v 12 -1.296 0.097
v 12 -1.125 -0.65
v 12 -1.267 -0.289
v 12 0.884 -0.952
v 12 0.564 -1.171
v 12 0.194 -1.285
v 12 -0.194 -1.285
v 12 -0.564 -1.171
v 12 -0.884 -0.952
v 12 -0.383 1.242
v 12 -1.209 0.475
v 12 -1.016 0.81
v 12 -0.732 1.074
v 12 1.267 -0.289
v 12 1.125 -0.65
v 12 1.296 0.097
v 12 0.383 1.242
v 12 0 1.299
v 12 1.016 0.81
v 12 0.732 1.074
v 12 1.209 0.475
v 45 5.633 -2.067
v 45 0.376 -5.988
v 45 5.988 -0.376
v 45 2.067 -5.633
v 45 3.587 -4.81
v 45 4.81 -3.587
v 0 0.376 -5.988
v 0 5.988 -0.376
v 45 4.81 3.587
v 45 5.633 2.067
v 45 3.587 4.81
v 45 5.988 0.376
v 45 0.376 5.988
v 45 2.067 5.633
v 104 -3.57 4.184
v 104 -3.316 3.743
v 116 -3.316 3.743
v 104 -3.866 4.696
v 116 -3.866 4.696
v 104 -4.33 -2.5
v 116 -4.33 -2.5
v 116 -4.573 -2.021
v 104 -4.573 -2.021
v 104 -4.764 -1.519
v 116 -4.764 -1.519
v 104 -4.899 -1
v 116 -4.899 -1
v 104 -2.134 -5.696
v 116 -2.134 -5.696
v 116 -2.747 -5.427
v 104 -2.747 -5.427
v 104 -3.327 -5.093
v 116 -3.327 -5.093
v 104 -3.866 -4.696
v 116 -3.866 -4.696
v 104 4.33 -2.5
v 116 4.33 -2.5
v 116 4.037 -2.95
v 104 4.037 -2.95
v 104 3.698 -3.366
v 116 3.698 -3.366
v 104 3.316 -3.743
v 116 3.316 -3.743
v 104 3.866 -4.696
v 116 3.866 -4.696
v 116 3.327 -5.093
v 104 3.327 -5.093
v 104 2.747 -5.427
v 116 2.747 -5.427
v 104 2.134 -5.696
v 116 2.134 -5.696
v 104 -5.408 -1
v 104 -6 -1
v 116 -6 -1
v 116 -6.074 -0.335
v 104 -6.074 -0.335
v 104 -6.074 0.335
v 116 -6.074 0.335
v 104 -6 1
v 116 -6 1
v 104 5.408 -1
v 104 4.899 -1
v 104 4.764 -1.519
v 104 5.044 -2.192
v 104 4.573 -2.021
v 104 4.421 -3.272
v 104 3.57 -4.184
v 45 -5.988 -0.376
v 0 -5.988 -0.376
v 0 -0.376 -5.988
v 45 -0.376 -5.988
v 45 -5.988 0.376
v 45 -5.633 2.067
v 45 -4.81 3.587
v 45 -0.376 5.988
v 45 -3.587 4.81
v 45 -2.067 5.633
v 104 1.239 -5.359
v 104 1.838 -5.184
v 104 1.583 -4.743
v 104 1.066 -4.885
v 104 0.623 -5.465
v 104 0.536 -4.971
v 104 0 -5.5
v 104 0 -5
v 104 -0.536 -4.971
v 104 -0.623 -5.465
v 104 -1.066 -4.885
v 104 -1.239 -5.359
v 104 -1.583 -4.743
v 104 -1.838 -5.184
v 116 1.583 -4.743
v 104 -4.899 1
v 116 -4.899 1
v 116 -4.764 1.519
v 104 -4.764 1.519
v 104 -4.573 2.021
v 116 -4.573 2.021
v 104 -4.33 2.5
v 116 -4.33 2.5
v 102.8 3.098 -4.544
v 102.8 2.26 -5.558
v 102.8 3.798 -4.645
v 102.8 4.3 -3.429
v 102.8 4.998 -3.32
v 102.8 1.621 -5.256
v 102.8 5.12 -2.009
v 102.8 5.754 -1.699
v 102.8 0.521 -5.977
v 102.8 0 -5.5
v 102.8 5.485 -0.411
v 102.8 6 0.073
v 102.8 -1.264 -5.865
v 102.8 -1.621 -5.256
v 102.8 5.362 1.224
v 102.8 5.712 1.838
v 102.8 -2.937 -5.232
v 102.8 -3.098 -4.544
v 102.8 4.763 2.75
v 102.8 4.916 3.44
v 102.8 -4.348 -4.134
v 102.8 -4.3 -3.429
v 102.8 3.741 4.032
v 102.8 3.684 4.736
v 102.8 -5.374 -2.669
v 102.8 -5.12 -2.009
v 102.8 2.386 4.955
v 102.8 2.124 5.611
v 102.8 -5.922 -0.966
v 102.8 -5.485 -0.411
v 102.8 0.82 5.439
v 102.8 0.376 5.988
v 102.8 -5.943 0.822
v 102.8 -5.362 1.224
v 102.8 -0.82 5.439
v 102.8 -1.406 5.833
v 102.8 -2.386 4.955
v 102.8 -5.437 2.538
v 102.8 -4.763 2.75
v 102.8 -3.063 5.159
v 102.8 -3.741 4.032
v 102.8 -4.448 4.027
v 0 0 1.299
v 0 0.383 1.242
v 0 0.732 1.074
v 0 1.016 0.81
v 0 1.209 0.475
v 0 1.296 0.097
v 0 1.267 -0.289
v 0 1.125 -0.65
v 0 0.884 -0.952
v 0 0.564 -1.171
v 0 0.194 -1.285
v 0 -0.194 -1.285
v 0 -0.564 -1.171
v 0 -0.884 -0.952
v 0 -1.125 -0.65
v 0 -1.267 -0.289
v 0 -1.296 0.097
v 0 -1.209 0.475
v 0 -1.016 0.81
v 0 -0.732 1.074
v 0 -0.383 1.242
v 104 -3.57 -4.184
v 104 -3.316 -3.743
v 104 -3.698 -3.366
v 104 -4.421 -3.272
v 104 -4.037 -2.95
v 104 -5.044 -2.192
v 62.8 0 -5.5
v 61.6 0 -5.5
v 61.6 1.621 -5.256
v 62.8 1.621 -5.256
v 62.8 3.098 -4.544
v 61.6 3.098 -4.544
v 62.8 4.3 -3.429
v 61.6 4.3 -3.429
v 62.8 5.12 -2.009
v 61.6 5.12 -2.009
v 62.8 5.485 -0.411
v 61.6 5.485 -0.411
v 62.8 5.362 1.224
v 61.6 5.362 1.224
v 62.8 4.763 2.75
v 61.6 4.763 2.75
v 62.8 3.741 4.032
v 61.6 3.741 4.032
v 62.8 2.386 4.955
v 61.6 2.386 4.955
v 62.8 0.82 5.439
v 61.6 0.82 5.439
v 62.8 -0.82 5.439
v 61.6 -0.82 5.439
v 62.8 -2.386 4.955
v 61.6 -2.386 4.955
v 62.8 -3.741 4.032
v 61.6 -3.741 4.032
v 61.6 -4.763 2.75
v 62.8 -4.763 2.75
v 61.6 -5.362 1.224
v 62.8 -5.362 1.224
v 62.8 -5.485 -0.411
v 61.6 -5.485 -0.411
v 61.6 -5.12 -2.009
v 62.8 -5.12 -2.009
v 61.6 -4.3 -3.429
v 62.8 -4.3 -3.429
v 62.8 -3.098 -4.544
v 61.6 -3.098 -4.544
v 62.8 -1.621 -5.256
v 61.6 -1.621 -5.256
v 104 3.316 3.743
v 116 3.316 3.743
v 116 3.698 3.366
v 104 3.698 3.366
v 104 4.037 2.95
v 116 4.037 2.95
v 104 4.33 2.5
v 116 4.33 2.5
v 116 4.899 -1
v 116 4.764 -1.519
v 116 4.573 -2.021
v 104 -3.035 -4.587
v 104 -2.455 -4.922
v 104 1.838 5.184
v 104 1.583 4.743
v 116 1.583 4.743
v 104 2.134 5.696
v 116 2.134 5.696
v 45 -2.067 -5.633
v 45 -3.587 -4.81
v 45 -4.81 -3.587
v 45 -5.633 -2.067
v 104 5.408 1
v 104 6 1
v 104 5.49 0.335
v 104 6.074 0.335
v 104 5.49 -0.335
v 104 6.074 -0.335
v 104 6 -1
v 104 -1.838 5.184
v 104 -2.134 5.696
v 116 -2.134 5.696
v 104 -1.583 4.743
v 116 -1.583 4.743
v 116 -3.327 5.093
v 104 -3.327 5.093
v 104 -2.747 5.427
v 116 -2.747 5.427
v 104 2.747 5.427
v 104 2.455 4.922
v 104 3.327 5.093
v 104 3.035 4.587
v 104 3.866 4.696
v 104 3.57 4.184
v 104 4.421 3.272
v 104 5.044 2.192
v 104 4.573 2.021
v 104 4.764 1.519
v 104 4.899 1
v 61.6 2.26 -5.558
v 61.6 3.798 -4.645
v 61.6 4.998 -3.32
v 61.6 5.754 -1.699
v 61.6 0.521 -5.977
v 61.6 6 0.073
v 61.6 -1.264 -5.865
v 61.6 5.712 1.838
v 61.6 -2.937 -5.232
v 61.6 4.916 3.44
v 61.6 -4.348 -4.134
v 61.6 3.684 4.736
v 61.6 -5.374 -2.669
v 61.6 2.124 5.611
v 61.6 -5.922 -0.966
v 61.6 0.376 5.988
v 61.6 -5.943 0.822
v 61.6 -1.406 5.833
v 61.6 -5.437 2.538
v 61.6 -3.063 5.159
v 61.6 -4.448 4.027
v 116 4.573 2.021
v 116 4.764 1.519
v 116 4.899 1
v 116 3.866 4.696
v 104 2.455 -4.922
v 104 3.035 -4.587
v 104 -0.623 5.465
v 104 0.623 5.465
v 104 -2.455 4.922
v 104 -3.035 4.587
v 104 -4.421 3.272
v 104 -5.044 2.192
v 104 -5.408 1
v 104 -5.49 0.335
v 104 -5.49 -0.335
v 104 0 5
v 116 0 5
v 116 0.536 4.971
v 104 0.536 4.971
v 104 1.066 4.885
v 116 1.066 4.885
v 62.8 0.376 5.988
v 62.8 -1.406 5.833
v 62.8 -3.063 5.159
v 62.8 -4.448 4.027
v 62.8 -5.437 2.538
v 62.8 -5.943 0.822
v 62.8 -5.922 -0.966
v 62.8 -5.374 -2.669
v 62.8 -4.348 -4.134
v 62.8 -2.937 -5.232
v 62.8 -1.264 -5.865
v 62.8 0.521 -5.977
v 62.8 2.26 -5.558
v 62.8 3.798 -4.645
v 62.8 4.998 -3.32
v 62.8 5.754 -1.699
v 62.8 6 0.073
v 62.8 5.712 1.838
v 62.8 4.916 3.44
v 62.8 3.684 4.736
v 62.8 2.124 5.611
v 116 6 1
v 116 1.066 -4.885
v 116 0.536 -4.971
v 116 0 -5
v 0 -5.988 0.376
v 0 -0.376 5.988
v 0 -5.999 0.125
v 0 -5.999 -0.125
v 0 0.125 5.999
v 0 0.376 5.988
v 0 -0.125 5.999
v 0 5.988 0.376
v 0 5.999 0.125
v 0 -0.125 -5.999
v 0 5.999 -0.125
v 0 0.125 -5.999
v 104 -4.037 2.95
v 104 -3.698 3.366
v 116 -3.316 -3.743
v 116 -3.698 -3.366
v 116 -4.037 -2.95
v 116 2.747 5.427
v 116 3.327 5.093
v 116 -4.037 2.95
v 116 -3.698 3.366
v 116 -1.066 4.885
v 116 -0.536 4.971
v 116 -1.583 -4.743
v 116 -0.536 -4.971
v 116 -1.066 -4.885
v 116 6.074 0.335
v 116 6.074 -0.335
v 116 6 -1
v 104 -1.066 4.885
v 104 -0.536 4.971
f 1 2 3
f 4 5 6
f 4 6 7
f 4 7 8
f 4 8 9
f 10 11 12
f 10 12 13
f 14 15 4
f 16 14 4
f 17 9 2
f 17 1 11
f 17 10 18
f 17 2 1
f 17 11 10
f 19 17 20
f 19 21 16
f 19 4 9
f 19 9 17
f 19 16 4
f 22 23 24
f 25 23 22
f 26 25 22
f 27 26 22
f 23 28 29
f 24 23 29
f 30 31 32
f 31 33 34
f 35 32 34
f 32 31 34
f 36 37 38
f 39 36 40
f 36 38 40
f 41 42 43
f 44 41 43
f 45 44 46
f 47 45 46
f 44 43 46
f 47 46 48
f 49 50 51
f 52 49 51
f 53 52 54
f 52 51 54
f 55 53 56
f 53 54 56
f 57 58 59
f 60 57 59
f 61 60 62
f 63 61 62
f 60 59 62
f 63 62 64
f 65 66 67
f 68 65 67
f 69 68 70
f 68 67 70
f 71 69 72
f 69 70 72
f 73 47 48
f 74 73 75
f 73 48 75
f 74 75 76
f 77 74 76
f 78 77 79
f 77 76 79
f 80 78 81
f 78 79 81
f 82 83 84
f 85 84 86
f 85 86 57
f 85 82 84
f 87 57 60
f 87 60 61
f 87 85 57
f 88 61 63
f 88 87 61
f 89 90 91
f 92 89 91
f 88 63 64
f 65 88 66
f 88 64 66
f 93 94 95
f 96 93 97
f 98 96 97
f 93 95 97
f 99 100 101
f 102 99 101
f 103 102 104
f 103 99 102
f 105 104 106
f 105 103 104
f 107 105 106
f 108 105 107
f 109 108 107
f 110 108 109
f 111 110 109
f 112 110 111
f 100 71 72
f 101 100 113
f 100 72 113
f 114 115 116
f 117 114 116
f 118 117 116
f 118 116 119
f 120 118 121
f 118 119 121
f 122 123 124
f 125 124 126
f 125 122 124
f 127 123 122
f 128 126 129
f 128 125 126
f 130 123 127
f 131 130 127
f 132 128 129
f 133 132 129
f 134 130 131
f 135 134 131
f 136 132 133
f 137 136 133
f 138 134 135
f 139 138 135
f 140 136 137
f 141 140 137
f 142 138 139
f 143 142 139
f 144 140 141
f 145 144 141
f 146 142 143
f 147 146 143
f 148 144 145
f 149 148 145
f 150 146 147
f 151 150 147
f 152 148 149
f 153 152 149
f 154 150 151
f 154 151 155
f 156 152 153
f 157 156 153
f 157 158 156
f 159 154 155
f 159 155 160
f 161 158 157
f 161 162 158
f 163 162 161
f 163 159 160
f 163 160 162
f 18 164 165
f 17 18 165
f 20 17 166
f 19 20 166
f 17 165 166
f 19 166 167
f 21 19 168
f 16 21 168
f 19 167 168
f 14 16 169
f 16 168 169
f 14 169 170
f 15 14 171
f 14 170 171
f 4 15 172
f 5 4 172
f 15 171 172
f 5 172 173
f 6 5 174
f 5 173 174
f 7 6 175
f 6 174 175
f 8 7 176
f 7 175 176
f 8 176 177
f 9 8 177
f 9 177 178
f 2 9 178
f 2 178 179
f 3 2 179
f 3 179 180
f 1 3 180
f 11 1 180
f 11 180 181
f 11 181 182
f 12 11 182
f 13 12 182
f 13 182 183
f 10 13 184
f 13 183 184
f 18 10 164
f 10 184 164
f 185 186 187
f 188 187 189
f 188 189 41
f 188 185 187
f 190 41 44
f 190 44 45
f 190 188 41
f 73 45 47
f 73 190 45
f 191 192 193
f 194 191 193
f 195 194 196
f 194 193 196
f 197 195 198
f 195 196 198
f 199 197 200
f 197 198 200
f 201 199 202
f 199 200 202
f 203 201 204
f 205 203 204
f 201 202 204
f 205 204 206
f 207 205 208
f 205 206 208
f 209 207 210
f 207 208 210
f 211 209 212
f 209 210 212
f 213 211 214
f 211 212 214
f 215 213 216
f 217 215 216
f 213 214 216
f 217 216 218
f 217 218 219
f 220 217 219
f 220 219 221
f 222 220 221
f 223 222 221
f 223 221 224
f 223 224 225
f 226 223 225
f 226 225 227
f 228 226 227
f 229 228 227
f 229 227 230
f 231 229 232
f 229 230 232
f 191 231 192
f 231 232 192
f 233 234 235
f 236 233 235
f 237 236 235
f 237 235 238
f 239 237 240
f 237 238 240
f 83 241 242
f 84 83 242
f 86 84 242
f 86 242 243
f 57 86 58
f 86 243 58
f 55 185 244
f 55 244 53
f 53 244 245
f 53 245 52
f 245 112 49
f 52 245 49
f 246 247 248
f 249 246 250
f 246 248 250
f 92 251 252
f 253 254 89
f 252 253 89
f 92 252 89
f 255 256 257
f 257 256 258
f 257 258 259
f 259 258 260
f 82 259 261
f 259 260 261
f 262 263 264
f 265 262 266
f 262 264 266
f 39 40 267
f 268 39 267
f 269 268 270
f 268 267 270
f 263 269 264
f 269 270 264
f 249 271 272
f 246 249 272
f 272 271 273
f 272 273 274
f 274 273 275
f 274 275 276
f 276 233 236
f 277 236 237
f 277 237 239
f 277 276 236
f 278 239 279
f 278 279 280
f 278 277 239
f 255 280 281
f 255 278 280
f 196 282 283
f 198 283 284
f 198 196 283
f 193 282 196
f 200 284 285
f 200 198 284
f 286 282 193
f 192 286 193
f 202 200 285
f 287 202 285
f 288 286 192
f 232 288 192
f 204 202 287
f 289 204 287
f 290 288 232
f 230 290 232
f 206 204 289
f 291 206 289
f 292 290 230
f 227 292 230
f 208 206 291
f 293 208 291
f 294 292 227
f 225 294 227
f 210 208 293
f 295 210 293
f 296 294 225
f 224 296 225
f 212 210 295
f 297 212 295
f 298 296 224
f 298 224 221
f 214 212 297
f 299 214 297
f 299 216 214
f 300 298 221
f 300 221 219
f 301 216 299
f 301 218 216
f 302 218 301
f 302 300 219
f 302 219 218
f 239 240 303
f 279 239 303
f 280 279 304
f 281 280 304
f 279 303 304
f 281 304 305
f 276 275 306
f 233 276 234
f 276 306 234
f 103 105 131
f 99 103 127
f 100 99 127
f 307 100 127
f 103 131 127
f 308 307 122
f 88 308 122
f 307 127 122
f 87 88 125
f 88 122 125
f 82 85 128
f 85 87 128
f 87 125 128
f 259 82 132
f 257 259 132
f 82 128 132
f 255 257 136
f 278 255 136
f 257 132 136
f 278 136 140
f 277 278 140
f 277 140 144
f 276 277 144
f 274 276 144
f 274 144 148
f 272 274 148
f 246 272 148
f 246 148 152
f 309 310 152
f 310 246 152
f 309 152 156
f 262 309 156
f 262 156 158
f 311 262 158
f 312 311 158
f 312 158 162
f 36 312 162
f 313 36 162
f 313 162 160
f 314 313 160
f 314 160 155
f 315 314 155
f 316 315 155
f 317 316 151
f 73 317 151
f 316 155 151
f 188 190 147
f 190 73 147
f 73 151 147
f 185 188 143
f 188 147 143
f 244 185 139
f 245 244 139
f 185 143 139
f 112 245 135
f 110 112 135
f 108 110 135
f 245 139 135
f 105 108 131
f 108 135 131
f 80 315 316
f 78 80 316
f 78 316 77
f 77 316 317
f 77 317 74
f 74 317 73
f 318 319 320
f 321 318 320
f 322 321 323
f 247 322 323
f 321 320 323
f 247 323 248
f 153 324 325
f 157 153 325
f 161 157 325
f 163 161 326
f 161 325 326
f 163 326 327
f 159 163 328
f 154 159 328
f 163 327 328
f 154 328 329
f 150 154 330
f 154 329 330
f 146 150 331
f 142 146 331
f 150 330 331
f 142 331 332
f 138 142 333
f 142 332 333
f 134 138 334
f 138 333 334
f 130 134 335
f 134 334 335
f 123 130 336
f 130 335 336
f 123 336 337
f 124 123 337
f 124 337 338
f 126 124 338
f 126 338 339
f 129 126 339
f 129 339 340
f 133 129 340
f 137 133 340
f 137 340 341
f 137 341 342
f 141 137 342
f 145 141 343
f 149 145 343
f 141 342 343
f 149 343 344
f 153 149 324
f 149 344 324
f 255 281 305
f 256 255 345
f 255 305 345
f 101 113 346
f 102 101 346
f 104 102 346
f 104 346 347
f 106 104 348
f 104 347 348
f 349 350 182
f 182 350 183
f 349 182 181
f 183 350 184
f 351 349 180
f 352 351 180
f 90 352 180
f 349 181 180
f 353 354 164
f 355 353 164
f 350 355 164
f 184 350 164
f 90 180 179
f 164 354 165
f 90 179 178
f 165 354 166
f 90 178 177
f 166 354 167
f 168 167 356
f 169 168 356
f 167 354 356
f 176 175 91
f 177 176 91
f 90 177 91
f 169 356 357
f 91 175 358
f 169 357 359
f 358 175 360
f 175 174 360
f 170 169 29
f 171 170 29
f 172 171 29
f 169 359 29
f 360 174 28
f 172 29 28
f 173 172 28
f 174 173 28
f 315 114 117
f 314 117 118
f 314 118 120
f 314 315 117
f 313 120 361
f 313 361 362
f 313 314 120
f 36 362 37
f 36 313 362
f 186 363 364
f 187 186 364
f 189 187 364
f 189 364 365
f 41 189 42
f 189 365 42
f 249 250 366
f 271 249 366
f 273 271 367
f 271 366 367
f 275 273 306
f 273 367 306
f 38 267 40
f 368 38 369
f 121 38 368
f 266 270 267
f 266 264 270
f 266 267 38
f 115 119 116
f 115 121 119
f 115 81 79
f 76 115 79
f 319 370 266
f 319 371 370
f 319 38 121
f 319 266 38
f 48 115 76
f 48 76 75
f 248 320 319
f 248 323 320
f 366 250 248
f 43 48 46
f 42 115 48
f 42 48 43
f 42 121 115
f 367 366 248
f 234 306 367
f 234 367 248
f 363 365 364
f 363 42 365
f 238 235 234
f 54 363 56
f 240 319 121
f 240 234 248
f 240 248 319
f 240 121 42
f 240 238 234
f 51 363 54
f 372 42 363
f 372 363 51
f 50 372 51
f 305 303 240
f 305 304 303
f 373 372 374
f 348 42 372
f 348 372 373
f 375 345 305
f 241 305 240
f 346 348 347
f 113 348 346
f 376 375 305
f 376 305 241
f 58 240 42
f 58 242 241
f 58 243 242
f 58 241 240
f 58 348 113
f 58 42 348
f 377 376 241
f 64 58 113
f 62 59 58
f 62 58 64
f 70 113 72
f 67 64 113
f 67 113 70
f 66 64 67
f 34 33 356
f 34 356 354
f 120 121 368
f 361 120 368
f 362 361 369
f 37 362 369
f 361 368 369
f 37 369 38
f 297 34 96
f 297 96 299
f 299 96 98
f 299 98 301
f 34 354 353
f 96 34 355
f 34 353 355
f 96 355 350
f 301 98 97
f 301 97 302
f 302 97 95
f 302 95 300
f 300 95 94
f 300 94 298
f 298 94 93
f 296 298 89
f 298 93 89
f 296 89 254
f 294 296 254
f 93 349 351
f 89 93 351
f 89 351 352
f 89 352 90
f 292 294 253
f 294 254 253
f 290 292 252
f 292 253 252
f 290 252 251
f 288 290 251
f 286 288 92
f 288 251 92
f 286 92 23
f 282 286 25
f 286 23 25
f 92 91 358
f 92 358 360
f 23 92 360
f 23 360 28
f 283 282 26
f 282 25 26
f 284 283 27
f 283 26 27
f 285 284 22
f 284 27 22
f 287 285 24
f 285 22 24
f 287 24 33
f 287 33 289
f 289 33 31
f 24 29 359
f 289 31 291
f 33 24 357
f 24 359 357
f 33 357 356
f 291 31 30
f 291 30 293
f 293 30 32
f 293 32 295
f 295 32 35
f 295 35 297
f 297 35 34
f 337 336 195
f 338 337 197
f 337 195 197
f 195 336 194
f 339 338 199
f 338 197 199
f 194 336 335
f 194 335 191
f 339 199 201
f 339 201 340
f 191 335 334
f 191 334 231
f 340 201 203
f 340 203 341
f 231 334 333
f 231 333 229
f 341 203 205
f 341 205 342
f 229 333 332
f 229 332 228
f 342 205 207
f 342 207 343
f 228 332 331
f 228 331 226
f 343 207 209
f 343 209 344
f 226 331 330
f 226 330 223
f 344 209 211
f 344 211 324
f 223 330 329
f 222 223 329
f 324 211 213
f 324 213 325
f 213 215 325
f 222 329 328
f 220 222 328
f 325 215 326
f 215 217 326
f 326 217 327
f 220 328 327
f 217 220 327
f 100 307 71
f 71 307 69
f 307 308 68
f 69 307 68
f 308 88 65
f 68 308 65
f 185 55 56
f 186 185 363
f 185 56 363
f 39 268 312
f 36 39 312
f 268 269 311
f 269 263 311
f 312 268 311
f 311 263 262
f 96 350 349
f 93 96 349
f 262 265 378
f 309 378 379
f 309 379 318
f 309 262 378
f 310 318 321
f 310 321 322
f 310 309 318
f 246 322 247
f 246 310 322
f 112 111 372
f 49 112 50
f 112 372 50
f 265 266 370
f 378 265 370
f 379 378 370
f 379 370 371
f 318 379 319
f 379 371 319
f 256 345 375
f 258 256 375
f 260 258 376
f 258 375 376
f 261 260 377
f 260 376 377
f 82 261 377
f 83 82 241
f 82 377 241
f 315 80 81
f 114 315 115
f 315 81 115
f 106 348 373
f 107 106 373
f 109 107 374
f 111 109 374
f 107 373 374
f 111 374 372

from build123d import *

# Parameters (mm, degrees)
EXTRUDE_1_DEPTH          = 45
SKETCH_2_R               = 6
EXTRUDE_2_DEPTH          = 16.6
SKETCH_3_R               = 5.5
EXTRUDE_3_DEPTH          = 1.2
SKETCH_4_R               = 6
EXTRUDE_4_DEPTH          = 40
SKETCH_5_R               = 5.5
EXTRUDE_5_DEPTH          = 1.2
SKETCH_6_R               = 7
EXTRUDE_6_DEPTH          = 12
CUT_EXTRUDE_1_DEPTH      = 12
PATTERN_CIRCULAR_1_COUNT = 6
SKETCH_9_OUTSIDE_W       = 38.206
SKETCH_9_OUTSIDE_H       = 38.206
SKETCH_9_OUTSIDE_R       = 6
CUT_EXTRUDE_2_DEPTH      = 72.56814934
SKETCH_13_R              = 1.29930571
CUT_EXTRUDE_3_DEPTH      = 12


with BuildPart() as part:
    # 草图1 → 凸台-拉伸1 (new body)
    with BuildSketch(Plane(origin=(0, 0, 0), x_dir=(0, 0, -1), z_dir=(1, 0, 0))):
        Polygon((6.363961031, 0), (0, 6.363961031), (-6.363961031, 0), (0, -6.363961031), align=None)
    extrude(amount=EXTRUDE_1_DEPTH)

    # 草图2 → 凸台-拉伸2 (add)
    with BuildSketch(Plane(origin=(45, 0, 0), x_dir=(0, 0, -1), z_dir=(1, 0, 0))):
        Circle(SKETCH_2_R)
    extrude(amount=EXTRUDE_2_DEPTH)

    # 草图3 → 凸台-拉伸3 (add)
    with BuildSketch(Plane(origin=(61.6, 0, 0), x_dir=(0, 0, -1), z_dir=(1, 0, 0))):
        Circle(SKETCH_3_R)
    extrude(amount=EXTRUDE_3_DEPTH)

    # 草图4 → 凸台-拉伸4 (add)
    with BuildSketch(Plane(origin=(62.8, 0, 0), x_dir=(0, 0, -1), z_dir=(1, 0, 0))):
        Circle(SKETCH_4_R)
    extrude(amount=EXTRUDE_4_DEPTH)

    # 草图5 → 凸台-拉伸5 (add)
    with BuildSketch(Plane(origin=(102.8, 0, 0), x_dir=(0, 0, -1), z_dir=(1, 0, 0))):
        Circle(SKETCH_5_R)
    extrude(amount=EXTRUDE_5_DEPTH)

    # 草图6 → 凸台-拉伸6 (add)
    with BuildSketch(Plane(origin=(104, 0, 0), x_dir=(0, 0, -1), z_dir=(1, 0, 0))):
        Circle(SKETCH_6_R)
    extrude(amount=EXTRUDE_6_DEPTH)

    # 草图7 → 切除-拉伸1 (cut)
    with BuildSketch(Plane(origin=(116, 0, 0), x_dir=(0, 0, -1), z_dir=(1, 0, 0))):
        with BuildLine():
            Line((1, 6), (1, 4.898979486))
            ThreePointArc((1, 4.898979486), (1.772963136, 4.675104461), (2.5, 4.330127019))
            Line((2.5, 4.330127019), (5, 8.660254038))
            ThreePointArc((5, 8.660254038), (0, 10), (-5, 8.660254038))
            Line((-5, 8.660254038), (-2.5, 4.330127019))
            ThreePointArc((-2.5, 4.330127019), (-1.772963136, 4.675104461), (-1, 4.898979486))
            Line((-1, 4.898979486), (-1, 6))
            ThreePointArc((-1, 6), (0, 6.08276253), (1, 6))
        make_face()
    cut_extrude_1 = extrude(amount=-CUT_EXTRUDE_1_DEPTH, mode=Mode.SUBTRACT)

    # 阵列(圆周)1: 切除-拉伸1 ×6 about axis
    pattern_circular_1_axis = Axis((88.99, 0, 0), (-1, 0, 0))
    for i in range(1, PATTERN_CIRCULAR_1_COUNT):
        add(cut_extrude_1.rotate(pattern_circular_1_axis, i * 360 / PATTERN_CIRCULAR_1_COUNT), mode=Mode.SUBTRACT)

    # 草图9 outside → 切除-拉伸2 (cut, through all)
    with BuildSketch(Plane.ZY.offset(-45)):
        Rectangle(SKETCH_9_OUTSIDE_W, SKETCH_9_OUTSIDE_H)
        Circle(SKETCH_9_OUTSIDE_R, mode=Mode.SUBTRACT)
    extrude(amount=CUT_EXTRUDE_2_DEPTH, mode=Mode.SUBTRACT)

    # 草图13 → 切除-拉伸3 (cut)
    with BuildSketch(Plane.ZY):
        Circle(SKETCH_13_R)
    extrude(amount=-CUT_EXTRUDE_3_DEPTH, mode=Mode.SUBTRACT)


solid = part.part
